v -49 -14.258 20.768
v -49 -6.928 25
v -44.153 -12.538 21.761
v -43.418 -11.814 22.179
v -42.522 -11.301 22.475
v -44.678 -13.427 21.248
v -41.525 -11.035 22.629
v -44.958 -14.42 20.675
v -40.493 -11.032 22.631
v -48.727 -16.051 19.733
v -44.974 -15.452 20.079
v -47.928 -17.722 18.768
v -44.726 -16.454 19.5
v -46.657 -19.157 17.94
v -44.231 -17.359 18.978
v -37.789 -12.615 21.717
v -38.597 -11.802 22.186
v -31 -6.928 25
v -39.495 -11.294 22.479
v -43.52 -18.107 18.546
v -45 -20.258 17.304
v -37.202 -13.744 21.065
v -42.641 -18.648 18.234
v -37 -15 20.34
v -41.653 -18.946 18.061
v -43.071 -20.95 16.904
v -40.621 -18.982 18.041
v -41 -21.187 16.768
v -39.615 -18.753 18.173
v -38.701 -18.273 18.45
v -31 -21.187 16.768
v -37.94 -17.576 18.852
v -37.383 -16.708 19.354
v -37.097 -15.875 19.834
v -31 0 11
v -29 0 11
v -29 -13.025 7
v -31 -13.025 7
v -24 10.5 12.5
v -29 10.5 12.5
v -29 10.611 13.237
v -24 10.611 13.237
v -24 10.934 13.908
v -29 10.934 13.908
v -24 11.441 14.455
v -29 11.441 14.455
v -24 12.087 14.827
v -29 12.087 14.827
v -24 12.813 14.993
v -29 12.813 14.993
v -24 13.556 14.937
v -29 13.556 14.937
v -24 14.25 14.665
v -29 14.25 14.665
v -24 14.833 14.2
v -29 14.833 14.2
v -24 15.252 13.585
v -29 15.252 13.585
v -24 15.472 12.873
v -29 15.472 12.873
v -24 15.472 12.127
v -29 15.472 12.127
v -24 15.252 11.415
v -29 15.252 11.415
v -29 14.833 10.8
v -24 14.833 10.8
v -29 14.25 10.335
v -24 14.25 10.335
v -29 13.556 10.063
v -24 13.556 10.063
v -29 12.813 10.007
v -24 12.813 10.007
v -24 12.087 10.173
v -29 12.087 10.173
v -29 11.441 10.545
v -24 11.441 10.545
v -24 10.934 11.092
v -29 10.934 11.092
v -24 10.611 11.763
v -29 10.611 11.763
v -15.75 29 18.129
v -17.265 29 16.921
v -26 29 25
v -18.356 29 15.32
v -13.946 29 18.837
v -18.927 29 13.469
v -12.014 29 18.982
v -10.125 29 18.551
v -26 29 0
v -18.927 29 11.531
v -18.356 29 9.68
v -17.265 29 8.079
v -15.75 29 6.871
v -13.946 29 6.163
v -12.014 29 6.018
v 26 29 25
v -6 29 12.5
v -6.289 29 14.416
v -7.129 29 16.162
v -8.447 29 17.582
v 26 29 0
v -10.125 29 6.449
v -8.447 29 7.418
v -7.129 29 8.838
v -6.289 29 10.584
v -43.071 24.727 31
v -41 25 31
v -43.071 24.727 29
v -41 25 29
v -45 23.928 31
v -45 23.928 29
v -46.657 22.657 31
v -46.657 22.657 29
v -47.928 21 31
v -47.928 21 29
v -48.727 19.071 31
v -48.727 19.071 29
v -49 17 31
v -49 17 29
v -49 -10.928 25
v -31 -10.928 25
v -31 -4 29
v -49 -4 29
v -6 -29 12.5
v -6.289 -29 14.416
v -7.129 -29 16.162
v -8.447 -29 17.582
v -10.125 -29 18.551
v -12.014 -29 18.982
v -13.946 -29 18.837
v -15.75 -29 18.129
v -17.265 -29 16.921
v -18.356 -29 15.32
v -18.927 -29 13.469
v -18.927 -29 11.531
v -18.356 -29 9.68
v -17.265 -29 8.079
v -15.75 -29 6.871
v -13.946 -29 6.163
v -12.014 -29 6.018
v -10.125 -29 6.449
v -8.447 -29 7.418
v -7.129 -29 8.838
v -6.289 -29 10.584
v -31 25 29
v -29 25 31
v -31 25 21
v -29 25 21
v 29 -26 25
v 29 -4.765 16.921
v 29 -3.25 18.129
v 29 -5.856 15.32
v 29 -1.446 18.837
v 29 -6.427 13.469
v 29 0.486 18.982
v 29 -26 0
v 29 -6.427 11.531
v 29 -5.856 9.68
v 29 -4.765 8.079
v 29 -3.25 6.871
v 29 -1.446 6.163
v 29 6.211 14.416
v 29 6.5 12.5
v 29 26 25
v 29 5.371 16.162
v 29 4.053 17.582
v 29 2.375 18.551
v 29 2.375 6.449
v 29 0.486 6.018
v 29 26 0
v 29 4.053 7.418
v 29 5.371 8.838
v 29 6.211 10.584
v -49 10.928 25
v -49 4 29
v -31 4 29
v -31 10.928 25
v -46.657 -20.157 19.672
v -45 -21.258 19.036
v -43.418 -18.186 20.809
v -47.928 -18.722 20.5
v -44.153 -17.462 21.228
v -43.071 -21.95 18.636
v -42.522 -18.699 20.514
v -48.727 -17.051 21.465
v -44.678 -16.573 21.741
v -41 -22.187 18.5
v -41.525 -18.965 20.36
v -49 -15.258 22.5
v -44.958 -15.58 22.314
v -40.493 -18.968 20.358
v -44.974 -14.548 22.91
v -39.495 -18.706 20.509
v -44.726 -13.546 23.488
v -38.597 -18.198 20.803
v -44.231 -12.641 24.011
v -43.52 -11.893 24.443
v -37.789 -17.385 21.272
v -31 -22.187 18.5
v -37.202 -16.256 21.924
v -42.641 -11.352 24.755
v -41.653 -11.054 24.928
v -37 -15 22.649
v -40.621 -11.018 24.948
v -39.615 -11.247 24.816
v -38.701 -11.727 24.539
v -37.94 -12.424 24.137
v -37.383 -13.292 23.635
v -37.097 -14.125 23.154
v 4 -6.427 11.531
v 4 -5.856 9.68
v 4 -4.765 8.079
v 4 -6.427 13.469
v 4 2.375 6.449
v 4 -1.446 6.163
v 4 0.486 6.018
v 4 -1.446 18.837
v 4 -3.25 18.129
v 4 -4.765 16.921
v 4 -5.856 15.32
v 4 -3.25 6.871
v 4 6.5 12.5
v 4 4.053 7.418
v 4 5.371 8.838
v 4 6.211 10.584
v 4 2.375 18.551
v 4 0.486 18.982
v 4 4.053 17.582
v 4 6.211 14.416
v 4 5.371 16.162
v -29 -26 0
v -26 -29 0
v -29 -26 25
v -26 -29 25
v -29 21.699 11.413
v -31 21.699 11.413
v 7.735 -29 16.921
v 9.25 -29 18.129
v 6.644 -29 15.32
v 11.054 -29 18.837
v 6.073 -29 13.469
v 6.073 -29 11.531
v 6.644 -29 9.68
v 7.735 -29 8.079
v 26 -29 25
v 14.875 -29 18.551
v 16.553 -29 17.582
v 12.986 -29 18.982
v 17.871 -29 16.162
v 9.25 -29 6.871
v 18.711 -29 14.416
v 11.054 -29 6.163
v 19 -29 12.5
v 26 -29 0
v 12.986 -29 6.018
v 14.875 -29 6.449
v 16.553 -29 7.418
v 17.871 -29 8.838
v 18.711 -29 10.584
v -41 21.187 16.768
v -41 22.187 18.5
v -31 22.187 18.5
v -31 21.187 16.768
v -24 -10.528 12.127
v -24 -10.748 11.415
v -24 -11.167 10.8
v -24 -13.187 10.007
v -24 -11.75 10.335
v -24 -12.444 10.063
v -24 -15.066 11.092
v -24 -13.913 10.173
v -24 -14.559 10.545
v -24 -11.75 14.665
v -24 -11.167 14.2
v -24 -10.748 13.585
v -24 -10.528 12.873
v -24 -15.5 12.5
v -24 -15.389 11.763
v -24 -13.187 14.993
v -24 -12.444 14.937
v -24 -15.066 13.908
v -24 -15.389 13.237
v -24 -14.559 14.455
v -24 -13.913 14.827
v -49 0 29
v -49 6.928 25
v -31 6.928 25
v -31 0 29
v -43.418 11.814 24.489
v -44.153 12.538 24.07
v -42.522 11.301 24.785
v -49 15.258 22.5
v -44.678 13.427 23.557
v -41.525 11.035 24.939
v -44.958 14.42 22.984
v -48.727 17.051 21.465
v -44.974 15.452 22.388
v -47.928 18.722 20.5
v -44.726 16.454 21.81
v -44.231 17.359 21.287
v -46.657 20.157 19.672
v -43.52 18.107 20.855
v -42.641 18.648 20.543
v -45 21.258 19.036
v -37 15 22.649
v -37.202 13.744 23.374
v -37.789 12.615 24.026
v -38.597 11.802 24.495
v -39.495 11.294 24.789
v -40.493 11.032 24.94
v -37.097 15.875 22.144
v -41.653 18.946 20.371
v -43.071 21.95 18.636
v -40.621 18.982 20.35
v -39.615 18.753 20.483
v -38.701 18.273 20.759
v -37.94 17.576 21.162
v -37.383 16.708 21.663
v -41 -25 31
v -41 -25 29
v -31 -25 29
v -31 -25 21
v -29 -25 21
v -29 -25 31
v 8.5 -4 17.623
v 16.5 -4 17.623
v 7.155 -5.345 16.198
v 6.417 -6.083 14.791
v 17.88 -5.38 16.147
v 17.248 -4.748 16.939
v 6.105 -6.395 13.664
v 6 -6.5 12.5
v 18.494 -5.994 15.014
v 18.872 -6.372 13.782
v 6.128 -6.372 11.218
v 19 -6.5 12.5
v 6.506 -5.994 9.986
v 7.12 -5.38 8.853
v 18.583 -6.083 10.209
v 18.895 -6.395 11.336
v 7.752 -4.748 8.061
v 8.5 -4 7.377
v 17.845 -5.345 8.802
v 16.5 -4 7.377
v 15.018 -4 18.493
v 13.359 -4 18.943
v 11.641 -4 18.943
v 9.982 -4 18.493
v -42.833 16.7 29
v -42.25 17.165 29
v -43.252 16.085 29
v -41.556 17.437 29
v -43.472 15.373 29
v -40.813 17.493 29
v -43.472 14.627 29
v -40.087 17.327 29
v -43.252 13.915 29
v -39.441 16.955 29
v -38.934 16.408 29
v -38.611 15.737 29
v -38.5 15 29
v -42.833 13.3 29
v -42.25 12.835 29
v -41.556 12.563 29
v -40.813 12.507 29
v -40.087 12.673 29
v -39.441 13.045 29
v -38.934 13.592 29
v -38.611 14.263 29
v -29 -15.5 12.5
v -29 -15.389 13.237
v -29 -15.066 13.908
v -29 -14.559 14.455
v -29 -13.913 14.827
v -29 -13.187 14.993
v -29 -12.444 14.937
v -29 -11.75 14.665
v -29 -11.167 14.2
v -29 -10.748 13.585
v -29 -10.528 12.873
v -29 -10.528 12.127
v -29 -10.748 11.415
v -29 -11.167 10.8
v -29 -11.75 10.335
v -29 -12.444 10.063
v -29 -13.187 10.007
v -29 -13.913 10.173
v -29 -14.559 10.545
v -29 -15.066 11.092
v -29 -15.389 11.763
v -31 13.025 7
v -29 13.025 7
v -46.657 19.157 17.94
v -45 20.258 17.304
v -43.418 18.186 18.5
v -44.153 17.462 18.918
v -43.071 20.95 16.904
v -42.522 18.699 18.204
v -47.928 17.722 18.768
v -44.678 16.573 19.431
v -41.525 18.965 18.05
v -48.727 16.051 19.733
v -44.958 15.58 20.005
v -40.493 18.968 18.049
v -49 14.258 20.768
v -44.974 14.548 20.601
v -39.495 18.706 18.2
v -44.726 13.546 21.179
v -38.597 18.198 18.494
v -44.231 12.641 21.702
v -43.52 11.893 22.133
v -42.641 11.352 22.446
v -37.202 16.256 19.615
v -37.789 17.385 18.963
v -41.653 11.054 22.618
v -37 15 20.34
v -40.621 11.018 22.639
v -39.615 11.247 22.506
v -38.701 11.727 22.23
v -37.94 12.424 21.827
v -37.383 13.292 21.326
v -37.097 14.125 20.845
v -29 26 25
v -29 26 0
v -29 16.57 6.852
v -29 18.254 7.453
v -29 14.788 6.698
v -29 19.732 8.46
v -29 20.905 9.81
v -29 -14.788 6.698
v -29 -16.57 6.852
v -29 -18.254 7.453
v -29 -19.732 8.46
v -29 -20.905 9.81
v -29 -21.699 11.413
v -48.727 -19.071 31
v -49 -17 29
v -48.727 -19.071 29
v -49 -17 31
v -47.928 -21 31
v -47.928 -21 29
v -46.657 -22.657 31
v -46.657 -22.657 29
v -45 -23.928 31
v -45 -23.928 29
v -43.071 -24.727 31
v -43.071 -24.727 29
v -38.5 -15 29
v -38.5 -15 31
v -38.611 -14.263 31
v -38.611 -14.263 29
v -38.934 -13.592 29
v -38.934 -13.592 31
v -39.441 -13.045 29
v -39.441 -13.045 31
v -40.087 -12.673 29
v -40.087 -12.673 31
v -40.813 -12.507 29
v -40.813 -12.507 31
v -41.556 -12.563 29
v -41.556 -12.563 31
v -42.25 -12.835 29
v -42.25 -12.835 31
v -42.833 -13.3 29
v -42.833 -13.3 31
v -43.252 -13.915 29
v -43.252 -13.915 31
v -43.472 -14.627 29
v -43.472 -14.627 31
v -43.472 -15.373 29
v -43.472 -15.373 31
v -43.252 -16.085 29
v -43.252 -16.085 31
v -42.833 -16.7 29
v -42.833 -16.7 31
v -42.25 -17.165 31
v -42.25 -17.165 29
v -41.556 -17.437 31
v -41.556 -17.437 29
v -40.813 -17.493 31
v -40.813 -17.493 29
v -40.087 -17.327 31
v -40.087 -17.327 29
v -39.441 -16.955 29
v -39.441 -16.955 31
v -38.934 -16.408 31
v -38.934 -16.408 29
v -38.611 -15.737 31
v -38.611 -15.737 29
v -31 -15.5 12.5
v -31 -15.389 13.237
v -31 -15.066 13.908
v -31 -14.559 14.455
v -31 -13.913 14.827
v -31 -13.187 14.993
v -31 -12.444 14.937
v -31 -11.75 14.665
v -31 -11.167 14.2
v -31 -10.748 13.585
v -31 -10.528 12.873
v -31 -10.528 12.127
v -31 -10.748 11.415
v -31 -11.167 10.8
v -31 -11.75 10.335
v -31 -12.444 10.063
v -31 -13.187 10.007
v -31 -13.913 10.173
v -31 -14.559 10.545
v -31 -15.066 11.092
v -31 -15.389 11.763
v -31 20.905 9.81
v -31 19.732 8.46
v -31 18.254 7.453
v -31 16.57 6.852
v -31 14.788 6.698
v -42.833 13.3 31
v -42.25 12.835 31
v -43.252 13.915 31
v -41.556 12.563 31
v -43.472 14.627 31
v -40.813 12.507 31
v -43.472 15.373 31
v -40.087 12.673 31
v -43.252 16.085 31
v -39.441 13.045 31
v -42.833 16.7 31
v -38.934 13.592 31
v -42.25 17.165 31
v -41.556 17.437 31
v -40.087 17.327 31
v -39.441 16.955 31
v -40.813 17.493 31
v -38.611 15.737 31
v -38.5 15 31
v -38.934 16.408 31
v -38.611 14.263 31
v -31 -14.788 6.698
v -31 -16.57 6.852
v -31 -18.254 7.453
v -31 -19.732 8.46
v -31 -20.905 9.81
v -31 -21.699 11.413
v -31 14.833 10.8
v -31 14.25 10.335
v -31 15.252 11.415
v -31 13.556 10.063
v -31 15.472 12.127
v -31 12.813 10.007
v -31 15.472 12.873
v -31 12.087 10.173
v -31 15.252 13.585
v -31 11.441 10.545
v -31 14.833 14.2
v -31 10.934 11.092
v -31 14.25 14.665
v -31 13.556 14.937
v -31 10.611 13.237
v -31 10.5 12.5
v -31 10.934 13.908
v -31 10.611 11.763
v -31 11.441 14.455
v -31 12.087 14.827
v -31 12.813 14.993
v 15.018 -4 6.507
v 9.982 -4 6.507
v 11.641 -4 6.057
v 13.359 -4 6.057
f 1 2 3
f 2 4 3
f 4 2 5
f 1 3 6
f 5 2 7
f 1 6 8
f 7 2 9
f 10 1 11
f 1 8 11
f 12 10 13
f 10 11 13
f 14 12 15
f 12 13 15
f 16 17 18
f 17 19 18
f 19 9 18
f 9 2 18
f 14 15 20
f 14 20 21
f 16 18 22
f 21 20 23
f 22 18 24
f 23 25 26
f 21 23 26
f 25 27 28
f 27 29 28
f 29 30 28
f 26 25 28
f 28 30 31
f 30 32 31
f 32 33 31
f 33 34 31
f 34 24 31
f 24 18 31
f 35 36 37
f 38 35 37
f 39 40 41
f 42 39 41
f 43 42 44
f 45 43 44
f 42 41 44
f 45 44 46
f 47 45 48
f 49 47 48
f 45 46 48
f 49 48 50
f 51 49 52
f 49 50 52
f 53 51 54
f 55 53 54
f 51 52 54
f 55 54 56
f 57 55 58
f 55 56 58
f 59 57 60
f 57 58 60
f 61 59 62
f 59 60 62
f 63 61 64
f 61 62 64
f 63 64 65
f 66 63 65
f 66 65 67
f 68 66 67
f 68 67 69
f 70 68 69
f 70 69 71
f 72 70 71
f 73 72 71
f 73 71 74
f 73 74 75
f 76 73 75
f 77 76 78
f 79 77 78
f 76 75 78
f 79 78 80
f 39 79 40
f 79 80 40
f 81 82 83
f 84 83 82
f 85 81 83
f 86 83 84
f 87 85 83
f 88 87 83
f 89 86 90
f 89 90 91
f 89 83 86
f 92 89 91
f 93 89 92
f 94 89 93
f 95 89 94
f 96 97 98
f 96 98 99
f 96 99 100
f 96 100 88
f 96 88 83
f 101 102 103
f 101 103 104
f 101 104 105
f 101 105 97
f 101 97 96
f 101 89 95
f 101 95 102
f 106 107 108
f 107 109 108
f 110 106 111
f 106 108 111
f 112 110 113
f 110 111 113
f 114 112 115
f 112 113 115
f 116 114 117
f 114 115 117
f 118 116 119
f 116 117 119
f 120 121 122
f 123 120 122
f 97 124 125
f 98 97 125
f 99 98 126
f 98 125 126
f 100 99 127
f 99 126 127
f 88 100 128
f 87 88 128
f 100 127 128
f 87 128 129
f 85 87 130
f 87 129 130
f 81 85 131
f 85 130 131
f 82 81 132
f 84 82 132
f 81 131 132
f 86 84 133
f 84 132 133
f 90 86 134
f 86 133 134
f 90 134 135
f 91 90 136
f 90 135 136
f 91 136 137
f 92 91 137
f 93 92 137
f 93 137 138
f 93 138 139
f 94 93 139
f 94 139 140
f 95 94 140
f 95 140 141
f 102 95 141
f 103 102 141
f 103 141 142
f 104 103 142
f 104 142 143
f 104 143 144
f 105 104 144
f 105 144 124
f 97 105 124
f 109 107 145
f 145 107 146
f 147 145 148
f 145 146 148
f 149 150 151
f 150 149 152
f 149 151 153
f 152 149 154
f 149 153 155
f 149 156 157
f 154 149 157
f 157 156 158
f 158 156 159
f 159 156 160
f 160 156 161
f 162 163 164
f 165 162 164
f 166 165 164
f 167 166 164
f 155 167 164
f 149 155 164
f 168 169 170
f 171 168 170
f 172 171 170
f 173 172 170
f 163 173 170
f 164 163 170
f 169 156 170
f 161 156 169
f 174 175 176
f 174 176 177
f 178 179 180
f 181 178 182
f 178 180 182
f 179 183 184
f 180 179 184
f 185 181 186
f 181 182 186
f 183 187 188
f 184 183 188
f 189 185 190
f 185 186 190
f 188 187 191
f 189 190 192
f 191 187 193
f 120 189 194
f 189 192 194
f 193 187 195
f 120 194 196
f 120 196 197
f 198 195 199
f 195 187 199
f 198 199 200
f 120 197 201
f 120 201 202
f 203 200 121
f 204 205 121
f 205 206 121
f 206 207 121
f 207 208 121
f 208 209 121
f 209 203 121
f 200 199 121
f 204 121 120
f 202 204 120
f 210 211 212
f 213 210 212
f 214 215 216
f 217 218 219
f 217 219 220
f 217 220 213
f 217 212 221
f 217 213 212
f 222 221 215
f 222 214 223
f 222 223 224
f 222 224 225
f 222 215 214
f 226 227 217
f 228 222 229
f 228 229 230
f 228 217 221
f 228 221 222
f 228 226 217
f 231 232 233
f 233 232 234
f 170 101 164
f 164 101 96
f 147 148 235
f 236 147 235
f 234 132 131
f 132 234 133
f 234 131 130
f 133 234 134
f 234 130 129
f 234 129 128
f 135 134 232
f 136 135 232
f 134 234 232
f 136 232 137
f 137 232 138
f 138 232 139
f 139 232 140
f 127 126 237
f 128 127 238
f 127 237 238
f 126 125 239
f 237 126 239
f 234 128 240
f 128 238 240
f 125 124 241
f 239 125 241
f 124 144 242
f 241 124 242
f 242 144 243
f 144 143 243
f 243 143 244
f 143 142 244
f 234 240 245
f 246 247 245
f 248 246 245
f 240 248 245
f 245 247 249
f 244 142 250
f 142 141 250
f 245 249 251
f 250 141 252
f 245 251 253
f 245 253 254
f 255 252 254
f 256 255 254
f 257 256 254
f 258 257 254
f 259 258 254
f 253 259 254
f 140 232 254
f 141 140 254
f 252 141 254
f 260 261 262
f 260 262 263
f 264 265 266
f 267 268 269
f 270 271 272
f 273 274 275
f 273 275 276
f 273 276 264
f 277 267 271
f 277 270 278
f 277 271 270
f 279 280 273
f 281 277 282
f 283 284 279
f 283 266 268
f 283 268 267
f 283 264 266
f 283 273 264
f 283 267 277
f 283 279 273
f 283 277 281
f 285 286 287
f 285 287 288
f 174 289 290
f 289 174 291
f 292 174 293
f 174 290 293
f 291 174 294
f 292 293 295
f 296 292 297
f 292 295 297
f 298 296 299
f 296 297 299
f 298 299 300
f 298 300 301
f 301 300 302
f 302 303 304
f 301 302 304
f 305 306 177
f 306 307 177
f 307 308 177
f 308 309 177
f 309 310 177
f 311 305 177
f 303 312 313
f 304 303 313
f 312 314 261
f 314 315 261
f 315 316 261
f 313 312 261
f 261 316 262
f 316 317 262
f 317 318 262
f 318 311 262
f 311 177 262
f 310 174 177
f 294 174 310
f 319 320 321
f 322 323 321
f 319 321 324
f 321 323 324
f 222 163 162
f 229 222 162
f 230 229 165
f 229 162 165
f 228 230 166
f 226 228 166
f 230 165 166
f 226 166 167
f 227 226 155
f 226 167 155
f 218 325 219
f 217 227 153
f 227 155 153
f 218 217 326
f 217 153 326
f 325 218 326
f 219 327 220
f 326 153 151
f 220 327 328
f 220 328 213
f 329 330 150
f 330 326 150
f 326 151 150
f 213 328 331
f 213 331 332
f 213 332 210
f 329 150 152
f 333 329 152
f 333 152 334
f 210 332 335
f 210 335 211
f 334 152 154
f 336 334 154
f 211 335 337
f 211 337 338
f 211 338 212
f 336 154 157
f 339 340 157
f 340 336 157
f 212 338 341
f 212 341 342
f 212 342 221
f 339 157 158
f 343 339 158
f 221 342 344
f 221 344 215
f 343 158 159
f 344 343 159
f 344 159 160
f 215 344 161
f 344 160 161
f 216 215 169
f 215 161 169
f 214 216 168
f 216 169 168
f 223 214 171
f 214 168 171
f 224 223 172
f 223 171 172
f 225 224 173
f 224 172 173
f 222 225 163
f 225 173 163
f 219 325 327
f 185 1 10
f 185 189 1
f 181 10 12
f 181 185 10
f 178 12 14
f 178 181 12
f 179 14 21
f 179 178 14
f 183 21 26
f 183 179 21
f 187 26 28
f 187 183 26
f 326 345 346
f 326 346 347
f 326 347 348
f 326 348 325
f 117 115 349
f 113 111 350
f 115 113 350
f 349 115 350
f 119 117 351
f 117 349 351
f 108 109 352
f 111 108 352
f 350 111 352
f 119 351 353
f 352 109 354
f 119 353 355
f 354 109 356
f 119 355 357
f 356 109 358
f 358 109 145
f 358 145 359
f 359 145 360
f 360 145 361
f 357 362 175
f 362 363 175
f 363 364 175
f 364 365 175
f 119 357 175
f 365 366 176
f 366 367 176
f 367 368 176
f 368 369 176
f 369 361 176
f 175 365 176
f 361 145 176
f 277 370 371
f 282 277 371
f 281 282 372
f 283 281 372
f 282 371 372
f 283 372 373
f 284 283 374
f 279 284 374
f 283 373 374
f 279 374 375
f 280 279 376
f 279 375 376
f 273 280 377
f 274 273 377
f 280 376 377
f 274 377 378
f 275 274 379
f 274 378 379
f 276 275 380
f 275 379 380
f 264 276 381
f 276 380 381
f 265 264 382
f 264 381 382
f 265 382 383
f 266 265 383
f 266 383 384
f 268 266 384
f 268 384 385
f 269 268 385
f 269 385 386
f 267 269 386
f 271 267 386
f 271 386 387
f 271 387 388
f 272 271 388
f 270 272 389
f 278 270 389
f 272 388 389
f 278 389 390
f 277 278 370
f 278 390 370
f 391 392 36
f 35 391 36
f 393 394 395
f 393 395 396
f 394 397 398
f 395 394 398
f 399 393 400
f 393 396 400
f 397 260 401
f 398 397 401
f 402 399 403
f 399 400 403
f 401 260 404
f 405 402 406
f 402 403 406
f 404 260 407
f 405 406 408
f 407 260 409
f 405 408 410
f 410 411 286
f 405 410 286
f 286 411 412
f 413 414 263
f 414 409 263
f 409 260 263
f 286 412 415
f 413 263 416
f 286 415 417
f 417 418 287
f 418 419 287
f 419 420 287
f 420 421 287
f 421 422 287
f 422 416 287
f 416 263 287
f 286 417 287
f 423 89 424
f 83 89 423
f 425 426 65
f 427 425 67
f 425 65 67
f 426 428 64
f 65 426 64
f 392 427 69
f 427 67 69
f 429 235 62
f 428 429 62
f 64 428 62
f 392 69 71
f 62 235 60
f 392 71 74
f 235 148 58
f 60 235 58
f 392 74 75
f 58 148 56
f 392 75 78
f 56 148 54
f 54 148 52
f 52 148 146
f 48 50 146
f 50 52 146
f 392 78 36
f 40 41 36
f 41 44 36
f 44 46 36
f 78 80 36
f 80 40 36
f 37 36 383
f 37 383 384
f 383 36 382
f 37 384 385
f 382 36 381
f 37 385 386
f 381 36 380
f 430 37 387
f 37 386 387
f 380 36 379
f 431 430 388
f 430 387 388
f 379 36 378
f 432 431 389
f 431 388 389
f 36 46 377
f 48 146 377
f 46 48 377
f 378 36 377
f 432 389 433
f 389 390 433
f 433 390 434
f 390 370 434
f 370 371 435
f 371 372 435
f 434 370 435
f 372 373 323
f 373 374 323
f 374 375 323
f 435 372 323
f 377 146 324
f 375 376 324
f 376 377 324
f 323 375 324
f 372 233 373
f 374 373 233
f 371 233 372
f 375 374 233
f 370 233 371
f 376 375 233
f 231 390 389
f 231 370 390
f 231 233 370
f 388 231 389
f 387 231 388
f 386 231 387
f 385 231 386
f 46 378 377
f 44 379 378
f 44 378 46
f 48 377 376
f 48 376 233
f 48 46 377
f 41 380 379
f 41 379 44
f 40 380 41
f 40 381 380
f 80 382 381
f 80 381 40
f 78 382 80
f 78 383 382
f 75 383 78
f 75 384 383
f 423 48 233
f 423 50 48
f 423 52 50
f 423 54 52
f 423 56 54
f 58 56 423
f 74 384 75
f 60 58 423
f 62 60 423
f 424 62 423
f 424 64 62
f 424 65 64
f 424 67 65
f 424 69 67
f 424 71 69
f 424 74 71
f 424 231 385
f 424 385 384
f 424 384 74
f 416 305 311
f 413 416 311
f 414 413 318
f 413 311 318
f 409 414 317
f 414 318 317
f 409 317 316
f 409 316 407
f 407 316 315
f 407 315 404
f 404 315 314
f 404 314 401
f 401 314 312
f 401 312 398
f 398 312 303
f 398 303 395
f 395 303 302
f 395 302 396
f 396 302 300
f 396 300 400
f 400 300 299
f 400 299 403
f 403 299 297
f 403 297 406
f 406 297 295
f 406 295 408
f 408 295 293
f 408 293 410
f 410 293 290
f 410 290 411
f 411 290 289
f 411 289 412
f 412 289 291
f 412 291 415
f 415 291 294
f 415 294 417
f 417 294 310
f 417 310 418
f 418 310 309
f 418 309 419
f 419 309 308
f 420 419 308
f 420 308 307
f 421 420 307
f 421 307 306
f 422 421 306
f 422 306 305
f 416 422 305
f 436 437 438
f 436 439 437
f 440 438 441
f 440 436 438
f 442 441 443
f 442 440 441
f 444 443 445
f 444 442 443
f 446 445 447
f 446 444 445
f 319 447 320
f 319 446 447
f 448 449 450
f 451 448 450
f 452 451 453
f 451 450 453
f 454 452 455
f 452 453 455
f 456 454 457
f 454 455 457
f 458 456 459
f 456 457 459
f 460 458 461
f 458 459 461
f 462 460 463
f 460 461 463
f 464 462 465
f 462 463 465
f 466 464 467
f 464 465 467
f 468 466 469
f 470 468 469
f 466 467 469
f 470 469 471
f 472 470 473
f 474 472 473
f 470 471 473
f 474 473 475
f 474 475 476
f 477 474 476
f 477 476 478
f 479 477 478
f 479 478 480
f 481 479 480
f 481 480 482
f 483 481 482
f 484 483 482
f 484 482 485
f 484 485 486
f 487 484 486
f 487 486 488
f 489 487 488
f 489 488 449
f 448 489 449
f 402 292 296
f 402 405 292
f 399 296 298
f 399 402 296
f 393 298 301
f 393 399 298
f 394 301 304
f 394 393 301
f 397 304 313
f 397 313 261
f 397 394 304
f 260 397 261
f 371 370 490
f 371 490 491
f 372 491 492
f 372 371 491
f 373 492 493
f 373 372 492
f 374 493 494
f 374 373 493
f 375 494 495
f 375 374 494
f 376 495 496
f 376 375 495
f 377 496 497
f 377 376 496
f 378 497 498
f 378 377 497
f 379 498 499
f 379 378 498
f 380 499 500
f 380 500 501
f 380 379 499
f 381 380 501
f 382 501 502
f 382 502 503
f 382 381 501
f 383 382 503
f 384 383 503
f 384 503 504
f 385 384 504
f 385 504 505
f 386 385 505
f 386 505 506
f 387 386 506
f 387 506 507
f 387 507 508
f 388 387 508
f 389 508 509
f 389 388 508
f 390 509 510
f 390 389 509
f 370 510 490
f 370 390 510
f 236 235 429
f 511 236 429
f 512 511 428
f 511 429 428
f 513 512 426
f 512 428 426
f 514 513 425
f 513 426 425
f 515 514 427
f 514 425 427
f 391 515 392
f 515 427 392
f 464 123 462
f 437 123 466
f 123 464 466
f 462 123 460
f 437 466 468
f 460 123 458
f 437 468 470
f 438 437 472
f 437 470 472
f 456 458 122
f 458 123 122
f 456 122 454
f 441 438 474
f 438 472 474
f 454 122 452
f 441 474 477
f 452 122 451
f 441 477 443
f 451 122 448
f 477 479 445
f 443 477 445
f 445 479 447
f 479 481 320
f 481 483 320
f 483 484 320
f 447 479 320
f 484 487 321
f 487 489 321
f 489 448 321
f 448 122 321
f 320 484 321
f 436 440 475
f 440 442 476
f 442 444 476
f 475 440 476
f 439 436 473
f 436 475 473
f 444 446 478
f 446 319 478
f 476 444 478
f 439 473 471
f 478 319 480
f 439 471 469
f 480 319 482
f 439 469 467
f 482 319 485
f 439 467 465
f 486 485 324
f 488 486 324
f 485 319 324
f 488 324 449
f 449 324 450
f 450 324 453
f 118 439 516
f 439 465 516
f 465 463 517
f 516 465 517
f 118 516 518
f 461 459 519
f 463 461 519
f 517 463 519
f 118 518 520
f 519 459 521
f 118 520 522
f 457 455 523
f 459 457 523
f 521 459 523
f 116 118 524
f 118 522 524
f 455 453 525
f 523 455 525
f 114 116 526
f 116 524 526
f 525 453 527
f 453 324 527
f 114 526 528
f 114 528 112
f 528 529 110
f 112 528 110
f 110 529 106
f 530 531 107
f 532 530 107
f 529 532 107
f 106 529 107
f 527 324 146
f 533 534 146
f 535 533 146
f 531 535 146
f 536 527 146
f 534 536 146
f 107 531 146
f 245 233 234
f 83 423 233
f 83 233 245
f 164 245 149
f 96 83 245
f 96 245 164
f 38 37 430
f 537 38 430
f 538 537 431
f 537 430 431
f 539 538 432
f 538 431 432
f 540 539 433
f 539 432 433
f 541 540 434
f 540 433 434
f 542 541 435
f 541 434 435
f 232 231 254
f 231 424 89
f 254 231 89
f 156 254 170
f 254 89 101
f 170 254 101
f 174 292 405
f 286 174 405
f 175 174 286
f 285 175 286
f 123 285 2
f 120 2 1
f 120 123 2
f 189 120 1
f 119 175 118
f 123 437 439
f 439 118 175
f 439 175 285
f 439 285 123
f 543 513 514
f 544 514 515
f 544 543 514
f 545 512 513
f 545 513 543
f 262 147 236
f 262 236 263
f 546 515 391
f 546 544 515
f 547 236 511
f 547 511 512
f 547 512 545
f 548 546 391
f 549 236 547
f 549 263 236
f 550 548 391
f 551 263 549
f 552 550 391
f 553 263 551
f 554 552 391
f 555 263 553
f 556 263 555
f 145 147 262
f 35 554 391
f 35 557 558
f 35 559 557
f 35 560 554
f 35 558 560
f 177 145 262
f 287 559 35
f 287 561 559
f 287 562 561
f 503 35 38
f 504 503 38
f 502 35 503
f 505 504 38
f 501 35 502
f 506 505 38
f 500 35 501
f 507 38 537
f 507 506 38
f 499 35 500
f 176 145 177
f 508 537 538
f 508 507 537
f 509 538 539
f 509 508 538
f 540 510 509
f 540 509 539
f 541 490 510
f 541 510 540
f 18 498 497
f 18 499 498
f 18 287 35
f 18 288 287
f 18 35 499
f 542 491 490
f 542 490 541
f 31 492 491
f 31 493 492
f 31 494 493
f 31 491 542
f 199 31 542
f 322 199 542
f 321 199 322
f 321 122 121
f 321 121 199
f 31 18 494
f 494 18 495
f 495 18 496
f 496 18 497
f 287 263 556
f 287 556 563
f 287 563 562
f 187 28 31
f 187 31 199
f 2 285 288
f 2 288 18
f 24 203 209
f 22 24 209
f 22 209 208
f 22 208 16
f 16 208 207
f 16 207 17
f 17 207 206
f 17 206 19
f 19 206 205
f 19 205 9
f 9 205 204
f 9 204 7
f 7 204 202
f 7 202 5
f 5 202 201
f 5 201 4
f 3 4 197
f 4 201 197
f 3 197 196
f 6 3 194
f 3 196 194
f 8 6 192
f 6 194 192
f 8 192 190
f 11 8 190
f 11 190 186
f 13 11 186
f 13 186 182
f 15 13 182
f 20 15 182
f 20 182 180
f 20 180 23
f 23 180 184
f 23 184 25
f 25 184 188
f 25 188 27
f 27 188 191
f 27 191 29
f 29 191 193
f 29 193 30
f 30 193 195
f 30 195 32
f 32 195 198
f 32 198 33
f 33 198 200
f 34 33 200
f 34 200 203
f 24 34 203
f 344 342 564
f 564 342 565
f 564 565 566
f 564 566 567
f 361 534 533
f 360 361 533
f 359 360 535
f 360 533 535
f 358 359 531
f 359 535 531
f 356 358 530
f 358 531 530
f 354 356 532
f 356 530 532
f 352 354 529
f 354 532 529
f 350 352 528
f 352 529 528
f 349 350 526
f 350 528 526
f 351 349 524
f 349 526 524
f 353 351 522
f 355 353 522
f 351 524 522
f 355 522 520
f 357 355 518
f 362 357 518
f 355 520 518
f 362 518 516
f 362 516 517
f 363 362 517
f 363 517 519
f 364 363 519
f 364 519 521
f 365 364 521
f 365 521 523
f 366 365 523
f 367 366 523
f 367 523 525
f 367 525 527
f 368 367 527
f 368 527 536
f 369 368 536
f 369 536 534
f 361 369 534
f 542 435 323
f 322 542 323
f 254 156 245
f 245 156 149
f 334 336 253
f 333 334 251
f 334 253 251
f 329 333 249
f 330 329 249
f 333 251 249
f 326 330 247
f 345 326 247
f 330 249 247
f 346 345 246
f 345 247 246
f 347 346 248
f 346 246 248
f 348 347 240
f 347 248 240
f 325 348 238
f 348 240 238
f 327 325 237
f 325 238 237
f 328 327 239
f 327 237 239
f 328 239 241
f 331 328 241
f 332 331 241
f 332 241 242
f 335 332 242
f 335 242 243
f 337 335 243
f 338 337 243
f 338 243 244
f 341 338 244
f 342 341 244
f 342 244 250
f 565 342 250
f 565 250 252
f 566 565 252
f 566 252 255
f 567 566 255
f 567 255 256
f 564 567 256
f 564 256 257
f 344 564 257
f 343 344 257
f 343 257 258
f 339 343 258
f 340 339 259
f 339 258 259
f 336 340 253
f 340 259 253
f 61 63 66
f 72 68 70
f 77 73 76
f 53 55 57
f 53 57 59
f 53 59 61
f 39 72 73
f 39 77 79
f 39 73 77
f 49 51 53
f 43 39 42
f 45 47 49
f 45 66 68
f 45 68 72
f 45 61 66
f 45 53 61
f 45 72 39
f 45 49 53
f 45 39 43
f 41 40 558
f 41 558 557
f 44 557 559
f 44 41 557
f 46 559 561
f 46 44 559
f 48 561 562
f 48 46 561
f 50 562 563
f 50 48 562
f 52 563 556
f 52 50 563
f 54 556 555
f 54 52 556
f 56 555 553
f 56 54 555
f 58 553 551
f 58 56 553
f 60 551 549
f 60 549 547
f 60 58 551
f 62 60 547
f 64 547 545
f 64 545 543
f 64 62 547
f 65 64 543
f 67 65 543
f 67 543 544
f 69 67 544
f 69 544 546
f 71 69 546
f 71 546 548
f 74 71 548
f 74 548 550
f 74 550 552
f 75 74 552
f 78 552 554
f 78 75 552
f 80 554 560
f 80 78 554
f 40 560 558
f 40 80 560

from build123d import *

# Parameters (mm, degrees)
F0_W      = 58
F0_H      = 58
F1_DEPTH  = 25
F2_SIZE   = 3
F3_R      = 6.5
F4_DEPTH  = 58.001
F5_DEPTH  = 25
F6_R      = 6.5
F7_DEPTH  = 25
F8_R      = 2.5
F9_DEPTH  = 5
F10_R     = 2.5
F11_DEPTH = 2
F12_DEPTH = 20
F13_R     = 2.5
F14_DEPTH = 3
F15_START = -3
F13_R_2   = 4
F15_DEPTH = 28.001
F16_R     = 8


with BuildPart() as f1:
    # F0 (on Top) → F1 (new body)
    with BuildSketch(Plane.XY):
        Rectangle(F0_W, F0_H)
    extrude(amount=F1_DEPTH)

    # F2
    f2_edges = [f1.edges().sort_by_distance(p)[0] for p in [
        (-29, -29, 12.5),
        (29, -29, 12.5),
        (29, 29, 12.5),
        (-29, 29, 12.5),
    ]]
    chamfer(f2_edges, length=F2_SIZE)

    # F3 (on face) → F4 (cut, through all)
    with BuildSketch(Plane.XZ.offset(29)):
        with Locations((-12.5, 12.5)):
            Circle(F3_R)
    extrude(amount=-F4_DEPTH, mode=Mode.SUBTRACT)

    # F3 (on face) → F5 (cut)
    with BuildSketch(Plane.XZ.offset(29)):
        with Locations((12.5, 12.5)):
            Circle(F3_R)
    extrude(amount=-F5_DEPTH, mode=Mode.SUBTRACT)

    # F6 (on face) → F7 (cut)
    with BuildSketch(Plane.YZ.offset(29)):
        with Locations((0, 12.5)):
            Circle(F6_R)
    extrude(amount=-F7_DEPTH, mode=Mode.SUBTRACT)

    # F8 (on face) → F9 (cut)
    with BuildSketch(Plane(origin=(-29, 0, 0), x_dir=(0, -1, 0), z_dir=(-1, 0, 0))):
        with Locations((-13, 12.5)):
            Circle(F8_R)
        with Locations((13, 12.5)):
            Circle(F8_R)
    extrude(amount=-F9_DEPTH, mode=Mode.SUBTRACT)


with BuildPart() as f11:
    # F10 (on face) → F11 (new body)
    with BuildSketch(Plane(origin=(-29, 0, 0), x_dir=(0, -1, 0), z_dir=(-1, 0, 0))):
        with BuildLine():
            Line((-25, 21), (-21.6987916019, 11.4125946606))
            ThreePointArc((-21.6987916019, 11.4125946606), (-18.2541992292, 7.4525425742), (-13.0251998641, 7))
            Line((-13.0251998641, 7), (0, 11))
            Line((0, 11), (13.0251998641, 7))
            ThreePointArc((13.0251998641, 7), (18.2541992292, 7.4525425742), (21.6987916019, 11.4125946606))
            Line((21.6987916019, 11.4125946606), (25, 21))
            Line((25, 21), (25, 25))
            Line((25, 25), (10.9282032303, 25))
            Line((10.9282032303, 25), (22.1865334795, 18.5))
            Line((22.1865334795, 18.5), (21.1865334795, 16.7679491924))
            Line((21.1865334795, 16.7679491924), (6.9282032303, 25))
            Line((6.9282032303, 25), (-6.9282032303, 25))
            Line((-6.9282032303, 25), (-21.1865334795, 16.7679491924))
            Line((-21.1865334795, 16.7679491924), (-22.1865334795, 18.5))
            Line((-22.1865334795, 18.5), (-10.9282032303, 25))
            Line((-10.9282032303, 25), (-25, 25))
            Line((-25, 25), (-25, 21))
        make_face()
        with Locations((-13, 12.5)):
            Circle(F10_R, mode=Mode.SUBTRACT)
        with Locations((13, 12.5)):
            Circle(F10_R, mode=Mode.SUBTRACT)
        Polygon((-25, 29), (-25, 25), (-10.9282032303, 25), (-4, 29), align=None)
        Polygon((-4, 29), (-10.9282032303, 25), (-6.9282032303, 25), (0, 29), align=None)
        Polygon((0, 29), (-6.9282032303, 25), (6.9282032303, 25), align=None)
        Polygon((-6.9282032303, 25), (-10.9282032303, 25), (-22.1865334795, 18.5), (-21.1865334795, 16.7679491924), align=None)
        Polygon((10.9282032303, 25), (6.9282032303, 25), (21.1865334795, 16.7679491924), (22.1865334795, 18.5), align=None)
        Polygon((4, 29), (0, 29), (6.9282032303, 25), (10.9282032303, 25), align=None)
        Polygon((25, 29), (4, 29), (10.9282032303, 25), (25, 25), align=None)
        Polygon((-25, 31), (-25, 29), (-4, 29), (0, 29), (4, 29), (25, 29), (25, 31), (0, 31), align=None)
    extrude(amount=F11_DEPTH)

    # F10 (on face) → F12 (join)
    with BuildSketch(Plane(origin=(-29, 0, 0), x_dir=(0, -1, 0), z_dir=(-1, 0, 0))):
        Polygon((-25, 31), (-25, 29), (-4, 29), (0, 29), (4, 29), (25, 29), (25, 31), (0, 31), align=None)
        Polygon((-4, 29), (-10.9282032303, 25), (-6.9282032303, 25), (0, 29), align=None)
        Polygon((-6.9282032303, 25), (-10.9282032303, 25), (-22.1865334795, 18.5), (-21.1865334795, 16.7679491924), align=None)
        Polygon((4, 29), (0, 29), (6.9282032303, 25), (10.9282032303, 25), align=None)
        Polygon((10.9282032303, 25), (6.9282032303, 25), (21.1865334795, 16.7679491924), (22.1865334795, 18.5), align=None)
    extrude(amount=F12_DEPTH)

    # F13 (on face) → F14 (cut)
    with BuildSketch(Plane.XY.offset(31)):
        with Locations((-41, -15)):
            Circle(F13_R)
        with Locations((-41, 15)):
            Circle(F13_R)
    extrude(amount=-F14_DEPTH, mode=Mode.SUBTRACT)

    # F13 (on face) → F15 (cut)
    with BuildSketch(Plane.XY.offset(31).offset(F15_START)):
        with Locations((-41, 15)):
            Circle(F13_R_2)
        with Locations((-41, 15)):
            Circle(F13_R, mode=Mode.SUBTRACT)
        with Locations((-41, -15)):
            Circle(F13_R_2)
        with Locations((-41, -15)):
            Circle(F13_R, mode=Mode.SUBTRACT)
        with Locations((-41, -15)):
            Circle(F13_R)
        with Locations((-41, 15)):
            Circle(F13_R)
    extrude(amount=-F15_DEPTH, mode=Mode.SUBTRACT)

    # F16
    f16_edges = [f11.edges().sort_by_distance(p)[0] for p in [
        (-49, 25, 30),
        (-49, 21.686533, 17.633975),
        (-49, -25, 30),
        (-49, -21.686533, 17.633975),
    ]]
    fillet(f16_edges, radius=F16_R)


solid = Compound([f1.part, f11.part])
